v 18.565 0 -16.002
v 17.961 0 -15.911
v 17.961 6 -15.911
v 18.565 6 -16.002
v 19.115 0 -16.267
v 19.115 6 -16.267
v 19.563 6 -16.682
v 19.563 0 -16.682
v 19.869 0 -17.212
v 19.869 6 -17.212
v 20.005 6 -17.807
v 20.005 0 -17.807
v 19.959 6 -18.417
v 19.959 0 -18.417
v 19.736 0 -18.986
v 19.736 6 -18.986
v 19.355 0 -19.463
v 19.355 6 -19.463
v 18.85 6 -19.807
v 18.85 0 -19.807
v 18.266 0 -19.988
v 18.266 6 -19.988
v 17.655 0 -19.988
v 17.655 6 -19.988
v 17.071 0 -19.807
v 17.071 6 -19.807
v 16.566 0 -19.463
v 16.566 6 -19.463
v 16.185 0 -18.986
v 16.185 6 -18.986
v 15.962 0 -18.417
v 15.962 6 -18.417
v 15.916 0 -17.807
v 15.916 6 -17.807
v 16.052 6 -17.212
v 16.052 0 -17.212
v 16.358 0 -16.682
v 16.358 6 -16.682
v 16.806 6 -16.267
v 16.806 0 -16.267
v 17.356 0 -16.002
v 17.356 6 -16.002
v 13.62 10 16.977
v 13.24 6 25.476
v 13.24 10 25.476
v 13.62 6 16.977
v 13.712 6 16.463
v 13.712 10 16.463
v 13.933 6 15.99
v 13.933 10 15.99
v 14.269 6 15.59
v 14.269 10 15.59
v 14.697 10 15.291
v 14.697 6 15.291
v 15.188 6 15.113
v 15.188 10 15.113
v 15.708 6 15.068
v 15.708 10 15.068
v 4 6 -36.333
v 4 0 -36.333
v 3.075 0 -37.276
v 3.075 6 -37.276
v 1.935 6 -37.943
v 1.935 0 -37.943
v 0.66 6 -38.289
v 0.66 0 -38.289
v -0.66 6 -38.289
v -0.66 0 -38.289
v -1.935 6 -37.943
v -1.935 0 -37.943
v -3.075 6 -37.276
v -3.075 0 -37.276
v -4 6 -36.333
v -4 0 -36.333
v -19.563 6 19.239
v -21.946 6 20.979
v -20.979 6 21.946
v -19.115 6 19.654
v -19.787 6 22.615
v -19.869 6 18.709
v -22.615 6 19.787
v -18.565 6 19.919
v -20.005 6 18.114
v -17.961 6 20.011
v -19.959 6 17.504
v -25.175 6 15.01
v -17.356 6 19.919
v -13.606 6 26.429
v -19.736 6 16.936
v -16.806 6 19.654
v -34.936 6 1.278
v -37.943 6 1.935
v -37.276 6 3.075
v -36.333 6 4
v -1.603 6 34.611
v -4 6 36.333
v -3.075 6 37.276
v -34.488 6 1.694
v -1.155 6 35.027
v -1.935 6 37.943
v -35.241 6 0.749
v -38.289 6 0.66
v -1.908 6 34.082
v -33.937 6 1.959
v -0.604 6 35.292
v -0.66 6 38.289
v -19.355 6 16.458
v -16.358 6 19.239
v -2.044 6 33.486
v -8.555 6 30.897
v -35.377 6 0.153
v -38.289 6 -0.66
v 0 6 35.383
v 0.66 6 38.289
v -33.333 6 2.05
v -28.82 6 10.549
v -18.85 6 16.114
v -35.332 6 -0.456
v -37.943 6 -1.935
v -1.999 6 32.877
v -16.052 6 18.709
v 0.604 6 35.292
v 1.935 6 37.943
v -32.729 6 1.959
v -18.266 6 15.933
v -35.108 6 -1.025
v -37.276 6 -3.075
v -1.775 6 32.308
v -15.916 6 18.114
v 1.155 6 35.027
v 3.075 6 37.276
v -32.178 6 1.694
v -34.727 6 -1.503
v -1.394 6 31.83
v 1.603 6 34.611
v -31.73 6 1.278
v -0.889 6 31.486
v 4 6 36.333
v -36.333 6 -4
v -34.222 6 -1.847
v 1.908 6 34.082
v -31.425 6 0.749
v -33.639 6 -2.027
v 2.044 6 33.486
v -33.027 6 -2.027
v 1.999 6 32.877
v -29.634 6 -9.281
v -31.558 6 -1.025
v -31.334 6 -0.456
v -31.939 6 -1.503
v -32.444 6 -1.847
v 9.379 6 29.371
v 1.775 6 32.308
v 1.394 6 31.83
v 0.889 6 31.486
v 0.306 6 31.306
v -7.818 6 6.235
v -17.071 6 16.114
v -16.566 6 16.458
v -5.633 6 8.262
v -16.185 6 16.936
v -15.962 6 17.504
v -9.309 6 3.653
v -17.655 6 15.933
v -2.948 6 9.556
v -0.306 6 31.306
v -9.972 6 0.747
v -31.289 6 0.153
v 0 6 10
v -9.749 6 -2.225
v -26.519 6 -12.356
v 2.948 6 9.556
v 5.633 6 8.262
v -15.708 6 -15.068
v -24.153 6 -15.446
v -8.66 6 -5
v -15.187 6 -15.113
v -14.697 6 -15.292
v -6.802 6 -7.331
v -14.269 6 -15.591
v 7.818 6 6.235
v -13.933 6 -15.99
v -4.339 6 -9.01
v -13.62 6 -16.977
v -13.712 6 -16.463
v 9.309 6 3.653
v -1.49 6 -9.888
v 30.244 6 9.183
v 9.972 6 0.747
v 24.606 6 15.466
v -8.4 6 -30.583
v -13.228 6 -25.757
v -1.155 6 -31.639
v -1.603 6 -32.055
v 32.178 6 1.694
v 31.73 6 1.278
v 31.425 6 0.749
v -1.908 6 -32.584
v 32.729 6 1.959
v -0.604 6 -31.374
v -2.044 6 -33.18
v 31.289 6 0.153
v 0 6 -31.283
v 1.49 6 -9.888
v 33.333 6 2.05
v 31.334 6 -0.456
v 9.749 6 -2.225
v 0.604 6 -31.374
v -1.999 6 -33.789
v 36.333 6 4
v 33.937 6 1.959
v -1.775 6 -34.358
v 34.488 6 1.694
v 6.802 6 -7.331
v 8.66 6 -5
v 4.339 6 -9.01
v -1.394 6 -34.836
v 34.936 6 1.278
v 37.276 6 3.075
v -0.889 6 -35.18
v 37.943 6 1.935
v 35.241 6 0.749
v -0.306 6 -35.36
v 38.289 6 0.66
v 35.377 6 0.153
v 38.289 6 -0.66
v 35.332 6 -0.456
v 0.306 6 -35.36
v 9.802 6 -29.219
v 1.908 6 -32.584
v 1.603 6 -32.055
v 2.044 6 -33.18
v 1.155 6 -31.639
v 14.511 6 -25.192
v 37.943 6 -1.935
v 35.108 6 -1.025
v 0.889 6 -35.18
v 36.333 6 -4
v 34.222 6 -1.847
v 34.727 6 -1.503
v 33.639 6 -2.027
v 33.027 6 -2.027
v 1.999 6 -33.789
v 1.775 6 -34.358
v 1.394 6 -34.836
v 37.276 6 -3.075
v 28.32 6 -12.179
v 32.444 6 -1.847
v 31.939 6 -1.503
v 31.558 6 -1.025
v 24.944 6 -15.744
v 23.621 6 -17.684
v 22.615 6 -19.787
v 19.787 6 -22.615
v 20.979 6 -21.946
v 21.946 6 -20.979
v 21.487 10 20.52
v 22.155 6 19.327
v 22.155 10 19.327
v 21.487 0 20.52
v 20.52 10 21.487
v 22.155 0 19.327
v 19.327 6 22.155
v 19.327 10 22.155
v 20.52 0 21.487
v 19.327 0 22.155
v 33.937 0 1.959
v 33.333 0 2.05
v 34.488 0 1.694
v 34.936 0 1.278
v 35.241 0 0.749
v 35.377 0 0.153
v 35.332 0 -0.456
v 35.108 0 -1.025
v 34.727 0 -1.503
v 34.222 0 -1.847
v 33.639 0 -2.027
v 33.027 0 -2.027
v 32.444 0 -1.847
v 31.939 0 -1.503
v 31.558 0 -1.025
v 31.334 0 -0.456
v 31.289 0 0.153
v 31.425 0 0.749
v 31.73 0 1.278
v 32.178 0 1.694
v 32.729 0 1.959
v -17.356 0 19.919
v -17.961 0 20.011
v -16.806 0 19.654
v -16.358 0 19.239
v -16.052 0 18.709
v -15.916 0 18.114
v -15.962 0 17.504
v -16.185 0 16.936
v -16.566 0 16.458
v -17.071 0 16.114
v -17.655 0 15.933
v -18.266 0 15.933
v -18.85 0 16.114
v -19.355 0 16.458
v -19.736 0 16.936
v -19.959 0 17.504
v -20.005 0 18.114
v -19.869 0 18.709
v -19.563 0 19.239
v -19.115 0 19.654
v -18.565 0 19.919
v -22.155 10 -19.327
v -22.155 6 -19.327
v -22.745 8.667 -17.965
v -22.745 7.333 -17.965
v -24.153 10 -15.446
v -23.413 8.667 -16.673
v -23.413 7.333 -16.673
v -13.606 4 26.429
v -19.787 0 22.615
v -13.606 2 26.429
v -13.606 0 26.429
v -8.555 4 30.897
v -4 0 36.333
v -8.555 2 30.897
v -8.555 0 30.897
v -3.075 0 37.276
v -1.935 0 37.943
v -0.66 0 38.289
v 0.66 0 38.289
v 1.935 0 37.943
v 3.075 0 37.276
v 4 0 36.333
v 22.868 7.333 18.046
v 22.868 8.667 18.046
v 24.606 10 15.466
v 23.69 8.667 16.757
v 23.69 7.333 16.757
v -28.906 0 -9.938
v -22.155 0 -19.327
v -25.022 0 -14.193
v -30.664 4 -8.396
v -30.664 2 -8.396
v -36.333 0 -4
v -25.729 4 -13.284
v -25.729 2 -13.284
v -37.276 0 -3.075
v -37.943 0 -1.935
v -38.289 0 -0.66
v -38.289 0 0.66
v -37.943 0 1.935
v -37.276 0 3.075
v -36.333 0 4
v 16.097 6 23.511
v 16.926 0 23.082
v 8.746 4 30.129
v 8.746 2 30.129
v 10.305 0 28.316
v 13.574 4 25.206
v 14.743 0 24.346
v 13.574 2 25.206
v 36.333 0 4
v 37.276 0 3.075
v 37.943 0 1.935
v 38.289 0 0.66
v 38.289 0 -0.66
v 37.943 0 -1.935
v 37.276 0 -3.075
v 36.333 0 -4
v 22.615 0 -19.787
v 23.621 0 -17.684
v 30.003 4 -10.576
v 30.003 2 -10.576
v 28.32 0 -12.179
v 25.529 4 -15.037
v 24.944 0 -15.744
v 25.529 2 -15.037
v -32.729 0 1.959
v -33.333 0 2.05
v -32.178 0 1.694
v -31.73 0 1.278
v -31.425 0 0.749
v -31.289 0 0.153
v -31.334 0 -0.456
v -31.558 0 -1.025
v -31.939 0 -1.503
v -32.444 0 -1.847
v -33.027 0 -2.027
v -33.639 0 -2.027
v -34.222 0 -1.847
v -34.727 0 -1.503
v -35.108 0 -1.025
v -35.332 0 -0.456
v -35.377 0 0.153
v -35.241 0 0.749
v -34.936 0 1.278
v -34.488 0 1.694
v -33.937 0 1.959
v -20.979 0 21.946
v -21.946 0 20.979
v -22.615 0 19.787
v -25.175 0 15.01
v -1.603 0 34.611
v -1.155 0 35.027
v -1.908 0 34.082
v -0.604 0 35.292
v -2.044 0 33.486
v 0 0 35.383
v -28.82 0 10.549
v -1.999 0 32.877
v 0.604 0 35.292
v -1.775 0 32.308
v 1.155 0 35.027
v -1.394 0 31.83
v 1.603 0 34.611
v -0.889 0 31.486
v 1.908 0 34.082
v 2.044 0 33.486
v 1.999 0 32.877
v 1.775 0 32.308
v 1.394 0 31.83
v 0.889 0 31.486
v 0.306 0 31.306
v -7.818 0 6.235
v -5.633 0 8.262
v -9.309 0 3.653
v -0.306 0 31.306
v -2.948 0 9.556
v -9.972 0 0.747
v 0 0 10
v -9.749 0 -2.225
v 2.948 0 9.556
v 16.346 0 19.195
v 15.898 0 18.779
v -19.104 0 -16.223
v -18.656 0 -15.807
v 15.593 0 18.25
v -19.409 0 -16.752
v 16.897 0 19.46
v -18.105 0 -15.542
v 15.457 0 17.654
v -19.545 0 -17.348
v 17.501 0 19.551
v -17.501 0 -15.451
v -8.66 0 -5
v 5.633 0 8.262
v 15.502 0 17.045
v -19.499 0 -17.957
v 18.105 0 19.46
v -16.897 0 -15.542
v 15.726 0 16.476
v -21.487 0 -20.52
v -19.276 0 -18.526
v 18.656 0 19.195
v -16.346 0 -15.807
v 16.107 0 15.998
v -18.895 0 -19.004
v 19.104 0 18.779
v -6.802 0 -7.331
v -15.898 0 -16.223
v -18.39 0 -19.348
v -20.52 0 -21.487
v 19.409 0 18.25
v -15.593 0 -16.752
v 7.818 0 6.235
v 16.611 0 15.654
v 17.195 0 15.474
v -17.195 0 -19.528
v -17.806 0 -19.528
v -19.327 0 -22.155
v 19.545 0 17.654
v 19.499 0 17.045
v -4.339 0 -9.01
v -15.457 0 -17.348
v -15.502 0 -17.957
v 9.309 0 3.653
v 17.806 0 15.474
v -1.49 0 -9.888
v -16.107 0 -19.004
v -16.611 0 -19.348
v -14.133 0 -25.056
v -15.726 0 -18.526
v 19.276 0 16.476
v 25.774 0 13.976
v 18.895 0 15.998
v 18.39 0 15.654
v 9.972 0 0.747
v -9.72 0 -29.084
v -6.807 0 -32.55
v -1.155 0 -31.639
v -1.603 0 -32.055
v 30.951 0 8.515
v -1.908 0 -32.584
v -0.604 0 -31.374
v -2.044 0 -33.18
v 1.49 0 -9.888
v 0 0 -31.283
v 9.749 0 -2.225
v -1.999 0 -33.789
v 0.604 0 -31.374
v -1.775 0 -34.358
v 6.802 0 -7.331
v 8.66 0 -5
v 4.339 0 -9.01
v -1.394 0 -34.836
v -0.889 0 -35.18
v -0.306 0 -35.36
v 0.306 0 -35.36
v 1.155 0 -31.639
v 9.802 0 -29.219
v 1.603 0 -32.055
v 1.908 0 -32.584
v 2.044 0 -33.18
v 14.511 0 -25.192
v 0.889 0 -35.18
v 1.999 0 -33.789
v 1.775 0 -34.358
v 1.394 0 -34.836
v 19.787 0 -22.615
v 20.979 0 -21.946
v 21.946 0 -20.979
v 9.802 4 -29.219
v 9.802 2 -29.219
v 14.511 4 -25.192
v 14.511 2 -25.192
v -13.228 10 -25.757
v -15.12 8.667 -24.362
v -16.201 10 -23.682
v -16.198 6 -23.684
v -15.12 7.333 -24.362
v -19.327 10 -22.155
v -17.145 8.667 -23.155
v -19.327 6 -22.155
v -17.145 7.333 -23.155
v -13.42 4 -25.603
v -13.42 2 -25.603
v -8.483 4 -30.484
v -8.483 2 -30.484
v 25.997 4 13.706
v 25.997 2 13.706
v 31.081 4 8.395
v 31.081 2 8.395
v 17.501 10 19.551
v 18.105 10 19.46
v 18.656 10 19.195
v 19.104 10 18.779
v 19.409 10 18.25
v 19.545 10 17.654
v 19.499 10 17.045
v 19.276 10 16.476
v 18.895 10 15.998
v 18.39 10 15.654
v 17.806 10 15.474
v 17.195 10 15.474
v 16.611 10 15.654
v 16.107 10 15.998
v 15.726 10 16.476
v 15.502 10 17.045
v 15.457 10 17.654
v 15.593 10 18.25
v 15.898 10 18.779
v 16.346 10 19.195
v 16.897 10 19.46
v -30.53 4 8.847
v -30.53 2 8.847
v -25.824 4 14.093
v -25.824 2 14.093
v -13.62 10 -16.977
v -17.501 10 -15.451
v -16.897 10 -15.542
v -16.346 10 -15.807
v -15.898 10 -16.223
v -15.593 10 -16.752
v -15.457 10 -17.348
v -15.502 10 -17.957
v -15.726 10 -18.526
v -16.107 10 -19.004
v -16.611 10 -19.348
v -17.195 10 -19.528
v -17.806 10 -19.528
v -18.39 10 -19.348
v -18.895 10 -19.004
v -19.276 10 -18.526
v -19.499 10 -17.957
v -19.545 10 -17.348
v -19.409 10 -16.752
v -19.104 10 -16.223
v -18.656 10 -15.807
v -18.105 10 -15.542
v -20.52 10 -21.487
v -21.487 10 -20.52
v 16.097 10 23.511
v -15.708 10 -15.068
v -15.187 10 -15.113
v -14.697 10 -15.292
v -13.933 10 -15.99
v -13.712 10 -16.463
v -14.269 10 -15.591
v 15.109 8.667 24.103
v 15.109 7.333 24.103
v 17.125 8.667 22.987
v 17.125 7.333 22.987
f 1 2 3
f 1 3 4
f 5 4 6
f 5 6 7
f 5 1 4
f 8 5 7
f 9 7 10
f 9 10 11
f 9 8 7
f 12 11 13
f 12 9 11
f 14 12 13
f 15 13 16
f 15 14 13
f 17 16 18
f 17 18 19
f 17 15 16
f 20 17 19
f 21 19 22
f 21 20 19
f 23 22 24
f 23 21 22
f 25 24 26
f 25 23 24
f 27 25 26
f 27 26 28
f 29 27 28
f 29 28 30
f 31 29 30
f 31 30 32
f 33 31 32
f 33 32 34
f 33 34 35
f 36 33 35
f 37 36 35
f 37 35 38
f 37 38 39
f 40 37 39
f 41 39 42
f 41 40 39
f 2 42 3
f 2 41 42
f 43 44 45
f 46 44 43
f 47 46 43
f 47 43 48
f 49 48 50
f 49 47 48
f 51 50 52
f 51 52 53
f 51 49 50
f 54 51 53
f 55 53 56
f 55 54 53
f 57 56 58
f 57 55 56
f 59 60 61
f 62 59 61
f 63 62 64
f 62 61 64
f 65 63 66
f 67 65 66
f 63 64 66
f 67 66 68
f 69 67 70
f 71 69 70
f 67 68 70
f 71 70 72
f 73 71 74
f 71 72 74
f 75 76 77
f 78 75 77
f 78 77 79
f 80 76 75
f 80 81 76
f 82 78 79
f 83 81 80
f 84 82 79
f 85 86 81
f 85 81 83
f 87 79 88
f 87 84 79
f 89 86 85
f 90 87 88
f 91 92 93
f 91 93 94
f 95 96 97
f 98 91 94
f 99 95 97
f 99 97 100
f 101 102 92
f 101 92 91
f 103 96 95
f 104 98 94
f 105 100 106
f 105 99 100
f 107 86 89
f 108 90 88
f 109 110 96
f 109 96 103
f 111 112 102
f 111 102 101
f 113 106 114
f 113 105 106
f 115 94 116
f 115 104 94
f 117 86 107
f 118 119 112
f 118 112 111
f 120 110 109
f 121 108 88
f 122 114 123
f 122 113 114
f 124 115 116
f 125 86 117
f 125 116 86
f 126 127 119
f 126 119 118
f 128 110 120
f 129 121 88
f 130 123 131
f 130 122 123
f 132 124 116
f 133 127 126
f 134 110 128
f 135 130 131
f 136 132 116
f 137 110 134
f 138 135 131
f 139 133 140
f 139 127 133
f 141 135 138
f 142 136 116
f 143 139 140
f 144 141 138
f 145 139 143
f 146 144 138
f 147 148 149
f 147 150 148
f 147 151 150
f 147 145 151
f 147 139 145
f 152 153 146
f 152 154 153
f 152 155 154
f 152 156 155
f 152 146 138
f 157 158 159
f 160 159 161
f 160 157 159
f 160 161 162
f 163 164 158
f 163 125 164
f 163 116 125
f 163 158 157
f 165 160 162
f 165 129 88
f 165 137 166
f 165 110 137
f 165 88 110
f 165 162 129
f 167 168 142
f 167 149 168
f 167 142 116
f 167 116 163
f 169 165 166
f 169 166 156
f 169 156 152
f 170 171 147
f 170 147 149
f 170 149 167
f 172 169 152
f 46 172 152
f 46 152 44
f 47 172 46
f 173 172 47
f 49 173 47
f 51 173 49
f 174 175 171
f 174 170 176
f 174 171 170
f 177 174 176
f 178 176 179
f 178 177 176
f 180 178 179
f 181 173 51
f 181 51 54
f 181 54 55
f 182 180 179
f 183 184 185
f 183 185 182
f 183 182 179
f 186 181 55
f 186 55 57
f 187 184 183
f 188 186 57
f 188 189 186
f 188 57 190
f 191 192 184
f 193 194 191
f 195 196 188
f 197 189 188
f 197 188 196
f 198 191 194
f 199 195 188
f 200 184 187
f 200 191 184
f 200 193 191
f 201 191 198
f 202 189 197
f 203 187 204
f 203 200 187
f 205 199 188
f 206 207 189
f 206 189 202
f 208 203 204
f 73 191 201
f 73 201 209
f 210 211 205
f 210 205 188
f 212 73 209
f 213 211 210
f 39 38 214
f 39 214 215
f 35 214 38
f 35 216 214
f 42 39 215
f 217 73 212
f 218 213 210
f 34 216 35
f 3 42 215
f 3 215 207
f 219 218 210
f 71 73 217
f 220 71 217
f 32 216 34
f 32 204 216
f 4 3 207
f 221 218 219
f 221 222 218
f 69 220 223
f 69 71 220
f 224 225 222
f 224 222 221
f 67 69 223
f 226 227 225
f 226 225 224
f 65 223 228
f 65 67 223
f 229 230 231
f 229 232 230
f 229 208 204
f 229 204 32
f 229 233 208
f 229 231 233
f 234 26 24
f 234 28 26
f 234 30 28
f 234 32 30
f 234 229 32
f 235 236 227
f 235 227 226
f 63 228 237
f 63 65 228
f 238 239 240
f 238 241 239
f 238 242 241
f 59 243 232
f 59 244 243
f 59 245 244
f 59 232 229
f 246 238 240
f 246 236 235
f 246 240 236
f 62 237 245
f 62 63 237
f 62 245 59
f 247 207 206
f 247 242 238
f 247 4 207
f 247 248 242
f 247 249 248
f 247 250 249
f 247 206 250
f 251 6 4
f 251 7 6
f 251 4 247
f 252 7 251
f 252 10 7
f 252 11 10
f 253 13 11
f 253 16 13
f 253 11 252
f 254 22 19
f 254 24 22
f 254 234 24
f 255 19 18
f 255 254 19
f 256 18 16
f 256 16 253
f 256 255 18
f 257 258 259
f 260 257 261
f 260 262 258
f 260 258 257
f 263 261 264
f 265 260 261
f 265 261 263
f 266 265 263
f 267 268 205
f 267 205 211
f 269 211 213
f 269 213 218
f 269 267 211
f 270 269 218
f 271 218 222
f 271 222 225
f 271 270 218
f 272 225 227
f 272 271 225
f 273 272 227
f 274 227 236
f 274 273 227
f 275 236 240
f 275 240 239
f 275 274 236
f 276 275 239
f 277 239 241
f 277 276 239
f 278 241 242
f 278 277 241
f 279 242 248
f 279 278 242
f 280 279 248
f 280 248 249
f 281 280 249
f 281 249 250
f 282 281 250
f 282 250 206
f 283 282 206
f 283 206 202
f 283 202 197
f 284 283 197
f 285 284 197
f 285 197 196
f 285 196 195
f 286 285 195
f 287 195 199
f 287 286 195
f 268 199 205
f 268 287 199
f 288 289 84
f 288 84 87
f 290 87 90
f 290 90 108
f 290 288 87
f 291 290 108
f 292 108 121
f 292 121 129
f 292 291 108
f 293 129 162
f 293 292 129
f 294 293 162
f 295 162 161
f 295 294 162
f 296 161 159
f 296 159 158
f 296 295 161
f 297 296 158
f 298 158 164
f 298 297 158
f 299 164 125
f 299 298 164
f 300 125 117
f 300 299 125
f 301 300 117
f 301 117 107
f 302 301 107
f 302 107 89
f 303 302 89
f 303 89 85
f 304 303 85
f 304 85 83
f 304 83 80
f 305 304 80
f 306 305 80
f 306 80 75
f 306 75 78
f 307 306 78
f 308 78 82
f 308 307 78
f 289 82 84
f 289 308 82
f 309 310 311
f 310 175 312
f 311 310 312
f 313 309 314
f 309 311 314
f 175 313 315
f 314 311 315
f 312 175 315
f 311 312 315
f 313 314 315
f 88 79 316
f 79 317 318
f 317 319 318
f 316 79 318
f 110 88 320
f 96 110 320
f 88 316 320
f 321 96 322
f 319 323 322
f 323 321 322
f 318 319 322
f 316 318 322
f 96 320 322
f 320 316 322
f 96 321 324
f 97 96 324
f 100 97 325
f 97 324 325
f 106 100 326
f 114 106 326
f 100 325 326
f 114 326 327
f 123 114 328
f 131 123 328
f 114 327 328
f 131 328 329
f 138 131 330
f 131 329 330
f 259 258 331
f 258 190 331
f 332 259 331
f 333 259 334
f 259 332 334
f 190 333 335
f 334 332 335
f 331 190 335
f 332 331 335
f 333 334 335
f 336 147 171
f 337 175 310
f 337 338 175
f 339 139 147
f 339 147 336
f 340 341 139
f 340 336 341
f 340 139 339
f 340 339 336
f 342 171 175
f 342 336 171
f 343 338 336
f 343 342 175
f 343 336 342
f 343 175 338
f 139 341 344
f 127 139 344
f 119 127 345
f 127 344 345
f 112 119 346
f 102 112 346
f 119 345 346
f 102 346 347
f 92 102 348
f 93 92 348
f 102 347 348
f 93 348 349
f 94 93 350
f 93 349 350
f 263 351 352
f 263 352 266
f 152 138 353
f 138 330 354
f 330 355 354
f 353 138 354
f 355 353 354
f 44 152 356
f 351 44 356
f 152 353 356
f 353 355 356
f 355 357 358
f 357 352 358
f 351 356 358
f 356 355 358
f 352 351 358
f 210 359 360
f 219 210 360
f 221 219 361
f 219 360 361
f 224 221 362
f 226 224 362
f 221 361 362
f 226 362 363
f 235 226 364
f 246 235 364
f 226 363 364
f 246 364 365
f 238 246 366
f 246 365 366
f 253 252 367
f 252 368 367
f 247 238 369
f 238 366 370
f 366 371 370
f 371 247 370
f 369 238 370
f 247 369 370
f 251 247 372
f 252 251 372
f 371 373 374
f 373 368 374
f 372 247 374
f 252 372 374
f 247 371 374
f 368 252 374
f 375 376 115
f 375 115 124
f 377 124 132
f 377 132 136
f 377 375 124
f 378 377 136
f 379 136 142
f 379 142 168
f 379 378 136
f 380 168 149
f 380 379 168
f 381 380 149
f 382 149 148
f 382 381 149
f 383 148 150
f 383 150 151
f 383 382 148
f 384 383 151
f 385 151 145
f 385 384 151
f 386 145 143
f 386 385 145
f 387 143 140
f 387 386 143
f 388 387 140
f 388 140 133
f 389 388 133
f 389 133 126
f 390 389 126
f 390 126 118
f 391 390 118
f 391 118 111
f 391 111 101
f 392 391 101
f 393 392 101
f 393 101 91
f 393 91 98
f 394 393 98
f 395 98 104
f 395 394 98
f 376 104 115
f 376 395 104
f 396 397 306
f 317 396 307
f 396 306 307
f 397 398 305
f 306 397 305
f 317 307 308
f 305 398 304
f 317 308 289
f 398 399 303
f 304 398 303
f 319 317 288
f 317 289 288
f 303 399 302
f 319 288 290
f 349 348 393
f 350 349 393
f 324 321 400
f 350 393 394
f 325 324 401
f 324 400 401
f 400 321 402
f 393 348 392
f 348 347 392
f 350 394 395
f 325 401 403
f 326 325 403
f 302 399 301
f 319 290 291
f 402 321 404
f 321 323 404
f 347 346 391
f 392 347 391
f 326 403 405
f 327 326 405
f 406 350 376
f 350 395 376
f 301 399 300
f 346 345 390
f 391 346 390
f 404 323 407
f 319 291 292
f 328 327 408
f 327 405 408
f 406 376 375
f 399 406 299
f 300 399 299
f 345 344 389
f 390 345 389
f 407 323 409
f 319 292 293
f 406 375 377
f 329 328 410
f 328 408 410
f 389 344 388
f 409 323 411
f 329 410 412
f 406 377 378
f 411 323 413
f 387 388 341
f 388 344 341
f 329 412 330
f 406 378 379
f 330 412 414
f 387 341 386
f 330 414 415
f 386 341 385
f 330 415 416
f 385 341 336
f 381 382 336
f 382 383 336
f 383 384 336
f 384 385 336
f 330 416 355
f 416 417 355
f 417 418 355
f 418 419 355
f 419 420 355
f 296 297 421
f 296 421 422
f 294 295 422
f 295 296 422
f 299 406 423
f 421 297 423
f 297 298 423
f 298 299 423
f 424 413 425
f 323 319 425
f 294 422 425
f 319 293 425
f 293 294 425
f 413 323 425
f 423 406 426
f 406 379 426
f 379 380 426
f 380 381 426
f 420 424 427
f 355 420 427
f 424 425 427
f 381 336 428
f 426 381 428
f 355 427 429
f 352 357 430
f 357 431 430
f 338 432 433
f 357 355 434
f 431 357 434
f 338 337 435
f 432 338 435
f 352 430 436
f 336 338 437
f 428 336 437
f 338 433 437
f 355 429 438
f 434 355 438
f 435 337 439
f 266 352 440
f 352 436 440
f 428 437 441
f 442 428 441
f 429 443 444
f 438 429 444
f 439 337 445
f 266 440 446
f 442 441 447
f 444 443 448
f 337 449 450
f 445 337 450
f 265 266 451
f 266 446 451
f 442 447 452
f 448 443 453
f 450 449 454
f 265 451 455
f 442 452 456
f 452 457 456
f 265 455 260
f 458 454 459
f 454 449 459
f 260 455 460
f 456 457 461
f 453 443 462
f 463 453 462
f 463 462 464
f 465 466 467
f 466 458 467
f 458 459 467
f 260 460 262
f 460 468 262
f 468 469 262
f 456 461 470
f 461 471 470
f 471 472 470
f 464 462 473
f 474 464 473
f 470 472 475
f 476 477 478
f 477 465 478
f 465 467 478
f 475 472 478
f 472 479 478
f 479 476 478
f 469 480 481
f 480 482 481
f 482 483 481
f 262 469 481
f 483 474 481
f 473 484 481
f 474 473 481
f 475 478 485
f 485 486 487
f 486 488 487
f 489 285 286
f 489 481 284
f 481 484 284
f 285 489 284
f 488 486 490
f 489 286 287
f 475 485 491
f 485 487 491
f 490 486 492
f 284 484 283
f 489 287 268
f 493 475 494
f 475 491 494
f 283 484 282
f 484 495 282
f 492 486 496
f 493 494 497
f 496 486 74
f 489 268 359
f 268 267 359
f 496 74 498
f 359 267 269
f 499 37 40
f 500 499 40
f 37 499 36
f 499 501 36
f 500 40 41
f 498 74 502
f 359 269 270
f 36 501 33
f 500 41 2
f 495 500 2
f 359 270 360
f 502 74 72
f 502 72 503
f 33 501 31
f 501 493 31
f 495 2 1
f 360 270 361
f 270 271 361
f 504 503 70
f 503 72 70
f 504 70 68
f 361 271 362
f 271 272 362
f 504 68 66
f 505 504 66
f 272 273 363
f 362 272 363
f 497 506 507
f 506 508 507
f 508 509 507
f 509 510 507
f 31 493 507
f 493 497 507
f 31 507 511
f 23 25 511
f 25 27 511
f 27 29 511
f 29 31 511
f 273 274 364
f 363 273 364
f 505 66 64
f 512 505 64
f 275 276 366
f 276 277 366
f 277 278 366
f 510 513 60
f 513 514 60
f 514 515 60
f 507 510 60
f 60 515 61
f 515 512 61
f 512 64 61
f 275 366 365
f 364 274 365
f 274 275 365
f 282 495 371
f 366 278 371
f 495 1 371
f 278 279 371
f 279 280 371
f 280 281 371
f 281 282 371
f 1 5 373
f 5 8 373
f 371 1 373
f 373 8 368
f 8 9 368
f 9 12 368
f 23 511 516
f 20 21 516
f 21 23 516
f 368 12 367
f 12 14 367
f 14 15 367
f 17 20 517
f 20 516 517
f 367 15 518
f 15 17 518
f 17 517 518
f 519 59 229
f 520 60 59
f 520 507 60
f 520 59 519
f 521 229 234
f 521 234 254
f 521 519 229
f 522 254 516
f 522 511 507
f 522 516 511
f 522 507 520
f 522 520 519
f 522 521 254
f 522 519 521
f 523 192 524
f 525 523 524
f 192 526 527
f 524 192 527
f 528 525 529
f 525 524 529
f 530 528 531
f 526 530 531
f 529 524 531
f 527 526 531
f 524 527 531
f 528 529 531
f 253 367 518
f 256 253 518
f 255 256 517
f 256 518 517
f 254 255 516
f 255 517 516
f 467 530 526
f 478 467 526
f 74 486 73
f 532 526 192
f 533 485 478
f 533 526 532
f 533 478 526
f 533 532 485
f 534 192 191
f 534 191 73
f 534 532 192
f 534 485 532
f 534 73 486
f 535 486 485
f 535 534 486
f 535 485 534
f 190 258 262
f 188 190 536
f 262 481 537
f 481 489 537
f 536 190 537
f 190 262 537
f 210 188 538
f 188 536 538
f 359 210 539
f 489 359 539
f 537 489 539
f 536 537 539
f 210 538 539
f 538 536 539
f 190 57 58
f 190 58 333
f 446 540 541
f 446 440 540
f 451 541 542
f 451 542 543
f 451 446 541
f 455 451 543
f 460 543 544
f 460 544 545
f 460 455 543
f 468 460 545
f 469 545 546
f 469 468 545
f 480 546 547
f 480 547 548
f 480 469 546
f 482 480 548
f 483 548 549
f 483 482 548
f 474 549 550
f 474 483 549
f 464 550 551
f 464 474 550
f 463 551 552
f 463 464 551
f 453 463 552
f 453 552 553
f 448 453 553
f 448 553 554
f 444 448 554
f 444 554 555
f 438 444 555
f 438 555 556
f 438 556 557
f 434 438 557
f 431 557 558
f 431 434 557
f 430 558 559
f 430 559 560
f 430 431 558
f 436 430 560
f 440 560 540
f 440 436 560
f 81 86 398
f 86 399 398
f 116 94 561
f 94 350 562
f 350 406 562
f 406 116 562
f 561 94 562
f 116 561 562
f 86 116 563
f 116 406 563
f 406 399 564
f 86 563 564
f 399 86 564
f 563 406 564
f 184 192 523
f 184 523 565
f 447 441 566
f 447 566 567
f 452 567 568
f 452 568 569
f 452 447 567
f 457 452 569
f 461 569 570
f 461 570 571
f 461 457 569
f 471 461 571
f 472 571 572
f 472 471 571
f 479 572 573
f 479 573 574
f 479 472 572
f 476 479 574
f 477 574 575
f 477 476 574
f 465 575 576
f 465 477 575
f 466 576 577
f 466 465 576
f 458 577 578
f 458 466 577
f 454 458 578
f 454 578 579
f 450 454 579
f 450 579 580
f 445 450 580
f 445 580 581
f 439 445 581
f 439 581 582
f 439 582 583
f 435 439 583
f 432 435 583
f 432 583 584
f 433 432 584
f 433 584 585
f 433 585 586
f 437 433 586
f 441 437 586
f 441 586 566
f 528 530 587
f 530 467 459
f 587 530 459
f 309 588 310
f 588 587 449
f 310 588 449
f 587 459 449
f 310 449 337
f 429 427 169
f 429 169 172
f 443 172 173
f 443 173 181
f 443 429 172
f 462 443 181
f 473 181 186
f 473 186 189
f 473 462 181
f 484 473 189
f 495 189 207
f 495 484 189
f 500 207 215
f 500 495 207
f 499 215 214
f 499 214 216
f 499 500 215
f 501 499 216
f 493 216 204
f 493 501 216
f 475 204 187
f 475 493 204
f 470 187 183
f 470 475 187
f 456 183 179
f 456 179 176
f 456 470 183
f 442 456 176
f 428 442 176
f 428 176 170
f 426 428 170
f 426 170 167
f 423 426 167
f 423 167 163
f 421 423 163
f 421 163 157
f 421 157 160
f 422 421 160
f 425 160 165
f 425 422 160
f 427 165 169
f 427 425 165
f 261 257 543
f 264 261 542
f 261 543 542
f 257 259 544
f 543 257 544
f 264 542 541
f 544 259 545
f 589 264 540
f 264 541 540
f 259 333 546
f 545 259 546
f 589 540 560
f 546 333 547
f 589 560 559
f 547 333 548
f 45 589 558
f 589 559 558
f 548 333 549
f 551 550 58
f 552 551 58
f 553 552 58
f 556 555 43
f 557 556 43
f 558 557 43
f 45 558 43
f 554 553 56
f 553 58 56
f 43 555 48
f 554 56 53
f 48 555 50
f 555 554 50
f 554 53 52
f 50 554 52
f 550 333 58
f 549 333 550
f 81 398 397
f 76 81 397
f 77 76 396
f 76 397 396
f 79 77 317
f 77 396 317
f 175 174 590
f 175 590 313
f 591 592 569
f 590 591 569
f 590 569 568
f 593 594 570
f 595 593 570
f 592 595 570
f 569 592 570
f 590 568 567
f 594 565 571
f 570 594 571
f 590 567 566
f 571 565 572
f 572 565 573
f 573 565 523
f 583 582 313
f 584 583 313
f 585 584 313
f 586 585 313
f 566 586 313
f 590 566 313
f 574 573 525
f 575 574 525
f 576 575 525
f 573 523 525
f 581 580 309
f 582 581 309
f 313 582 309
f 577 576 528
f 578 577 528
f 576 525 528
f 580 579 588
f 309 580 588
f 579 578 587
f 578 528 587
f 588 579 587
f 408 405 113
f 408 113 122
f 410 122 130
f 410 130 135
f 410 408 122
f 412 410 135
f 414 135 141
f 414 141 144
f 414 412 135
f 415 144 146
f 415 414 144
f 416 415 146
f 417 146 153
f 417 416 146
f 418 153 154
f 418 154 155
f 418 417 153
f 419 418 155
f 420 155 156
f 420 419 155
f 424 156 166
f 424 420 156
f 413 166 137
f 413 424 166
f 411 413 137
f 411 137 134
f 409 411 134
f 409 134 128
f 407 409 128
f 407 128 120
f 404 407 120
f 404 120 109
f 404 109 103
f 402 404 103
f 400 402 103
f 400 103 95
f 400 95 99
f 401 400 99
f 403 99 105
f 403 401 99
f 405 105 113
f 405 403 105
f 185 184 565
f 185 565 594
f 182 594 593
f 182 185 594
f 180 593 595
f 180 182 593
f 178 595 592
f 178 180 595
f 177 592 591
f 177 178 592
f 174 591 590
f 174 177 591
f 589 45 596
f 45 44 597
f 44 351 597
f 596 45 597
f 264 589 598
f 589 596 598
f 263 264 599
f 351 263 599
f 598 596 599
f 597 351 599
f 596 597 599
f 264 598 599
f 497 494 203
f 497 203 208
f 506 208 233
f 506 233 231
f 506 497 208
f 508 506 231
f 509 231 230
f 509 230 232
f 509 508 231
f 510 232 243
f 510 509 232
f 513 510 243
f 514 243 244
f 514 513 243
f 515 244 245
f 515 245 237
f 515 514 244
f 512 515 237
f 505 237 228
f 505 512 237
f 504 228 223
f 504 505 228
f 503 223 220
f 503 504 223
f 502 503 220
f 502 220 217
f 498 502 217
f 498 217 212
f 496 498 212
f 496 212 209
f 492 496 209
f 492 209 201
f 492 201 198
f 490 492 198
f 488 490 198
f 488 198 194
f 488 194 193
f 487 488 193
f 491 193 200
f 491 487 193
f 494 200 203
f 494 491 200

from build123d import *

# Parameters (mm, degrees)
SKETCH2_R           = 2.05
SKETCH2_R_2         = 10
BOSS_EXTRUDE1_DEPTH = 6
SKETCH4_R           = 2.05
BOSS_EXTRUDE2_DEPTH = 4


with BuildPart() as part:
    # Sketch2 → Boss-Extrude1 (new body)
    with BuildSketch(Plane(origin=(0, 0, 0), x_dir=(1, 0, 0), z_dir=(0, 1, 0))):
        with BuildLine():
            ThreePointArc((4, 36.333013665), (0, 38.333013665), (-4, 36.333013665))
            add(Edge.make_bspline(
                [(-19.327049621, 22.155476746), (-12.763587626, 24.730553465), (-8.427522415, 30.156498127), (-4, 36.333013665)],
                knots=[0, 0, 0, 0, 1, 1, 1, 1], degree=3))
            ThreePointArc((-19.327049621, 22.155476746), (-21.03642674, 21.03642674), (-22.155476746, 19.327049621))
            add(Edge.make_bspline(
                [(-36.333013665, 4), (-30.505064465, 8.3709619), (-24.839849632, 12.485009038), (-22.155476746, 19.327049621)],
                knots=[0, 0, 0, 0, 1, 1, 1, 1], degree=3))
            ThreePointArc((-36.333013665, 4), (-38.333013665, 0), (-36.333013665, -4))
            add(Edge.make_bspline(
                [(-36.333013665, -4), (-30.114152071, -8.664146195), (-24.942929086, -13.853392219), (-22.615096154, -19.786669029)],
                knots=[0, 0, 0, 0, 1, 1, 1, 1], degree=3))
            ThreePointArc((-22.615096154, -19.786669029), (-21.496046148, -21.496046148), (-19.786669029, -22.615096154))
            add(Edge.make_bspline(
                [(-19.786669029, -22.615096154), (-12.829111765, -26.205220822), (-8.517950555, -30.309079592), (-4, -36.333013665)],
                knots=[0, 0, 0, 0, 1, 1, 1, 1], degree=3))
            ThreePointArc((-4, -36.333013665), (0, -38.333013665), (4, -36.333013665))
            add(Edge.make_bspline(
                [(4, -36.333013665), (8.986714341, -29.68406121), (12.829629407, -24.073808118), (19.327049621, -22.155476746)],
                knots=[0, 0, 0, 0, 1, 1, 1, 1], degree=3))
            ThreePointArc((19.327049621, -22.155476746), (21.03642674, -21.03642674), (22.155476746, -19.327049621))
            add(Edge.make_bspline(
                [(22.155476746, -19.327049621), (25.018370869, -13.753003663), (31.354300327, -7.734035003), (36.333013665, -4)],
                knots=[0, 0, 0, 0, 1, 1, 1, 1], degree=3))
            ThreePointArc((36.333013665, -4), (38.333013665, 0), (36.333013665, 4))
            add(Edge.make_bspline(
                [(36.333013665, 4), (28.974985707, 12.434827797), (24.849369186, 14.09186156), (22.615096154, 19.786669029)],
                knots=[0, 0, 0, 0, 1, 1, 1, 1], degree=3))
            ThreePointArc((22.615096154, 19.786669029), (21.496046148, 21.496046148), (19.786669029, 22.615096154))
            add(Edge.make_bspline(
                [(4, 36.333013665), (10.902815442, 27.129259742), (13.673195705, 25.013626509), (19.786669029, 22.615096154)],
                knots=[0, 0, 0, 0, 1, 1, 1, 1], degree=3))
        make_face()
        with Locations(Location((0, 33.333013665, 0), (0, 0, 270))):
            Circle(SKETCH2_R, mode=Mode.SUBTRACT)
        with Locations(Location((33.333013665, 0, 0), (0, 0, 270))):
            Circle(SKETCH2_R, mode=Mode.SUBTRACT)
        with Locations(Location((0, -33.333013665, 0), (0, 0, 270))):
            Circle(SKETCH2_R, mode=Mode.SUBTRACT)
        with Locations(Location((-33.333013665, 0, 0), (0, 0, 270))):
            Circle(SKETCH2_R, mode=Mode.SUBTRACT)
        with Locations(Location((0, 0, 0), (0, 0, 270))):
            Circle(SKETCH2_R_2, mode=Mode.SUBTRACT)
        with Locations(Location((-17.500892834, 17.500892834, 0), (0, 0, 270))):
            Circle(SKETCH2_R, mode=Mode.SUBTRACT)
        with Locations(Location((-17.960512242, -17.960512242, 0), (0, 0, 270))):
            Circle(SKETCH2_R, mode=Mode.SUBTRACT)
        with Locations(Location((17.960512242, 17.960512242, 0), (0, 0, 270))):
            Circle(SKETCH2_R, mode=Mode.SUBTRACT)
        with Locations(Location((17.500892834, -17.500892834, 0), (0, 0, 270))):
            Circle(SKETCH2_R, mode=Mode.SUBTRACT)
    extrude(amount=BOSS_EXTRUDE1_DEPTH)

    # Sketch4 → Boss-Extrude2 (add)
    # profile 1 of 2: a face of its own
    with BuildSketch(Plane(origin=(0, 6, 0), x_dir=(1, 0, 0), z_dir=(0, 1, 0))):
        with BuildLine():
            Line((15.707753118, -15.068373573), (24.606369586, -15.466232362))
            add(Edge.make_bspline(
                [(22.155476746, -19.327049621), (22.810102957, -18.052494423), (23.646316442, -16.75467649), (24.606369586, -15.466232362)],
                knots=[0, 0, 0, 0, 0.228658897, 0.228658897, 0.228658897, 0.228658897], degree=3))
            ThreePointArc((22.155476746, -19.327049621), (21.03642674, -21.03642674), (19.327049621, -22.155476746))
            add(Edge.make_bspline(
                [(13.240425147, -25.476068549), (15.048020958, -23.982995667), (17.020234836, -22.836552469), (19.327049621, -22.155476746)],
                knots=[0.644964508, 0.644964508, 0.644964508, 0.644964508, 1, 1, 1, 1], degree=3))
            Line((13.240425147, -25.476068549), (13.620417999, -16.977046436))
            ThreePointArc((13.620417999, -16.977046436), (14.268786465, -15.590408746), (15.707753118, -15.068373573))
        make_face()
        with Locations(Location((17.500892834, -17.500892834, 0), (0, 0, 270))):
            Circle(SKETCH4_R, mode=Mode.SUBTRACT)
    # profile 2 of 2: a face of its own
    with BuildSketch(Plane(origin=(0, 6, 0), x_dir=(1, 0, 0), z_dir=(0, 1, 0))):
        with BuildLine():
            Line((-13.228436316, 25.756908597), (-13.620382808, 16.977307181))
            ThreePointArc((-13.620382808, 16.977307181), (-14.2686581, 15.590625928), (-15.707589672, 15.068494066))
            Line((-15.707589672, 15.068494066), (-24.152657128, 15.445506006))
            add(Edge.make_bspline(
                [(-22.155476746, 19.327049621), (-22.704535018, 17.927587199), (-23.378300091, 16.642253384), (-24.152657128, 15.445506006)],
                knots=[0, 0, 0, 0, 0.204538749, 0.204538749, 0.204538749, 0.204538749], degree=3))
            ThreePointArc((-22.155476746, 19.327049621), (-21.03642674, 21.03642674), (-19.327049621, 22.155476746))
            add(Edge.make_bspline(
                [(-13.228436316, 25.756908597), (-15.059327702, 24.27409121), (-17.060362093, 23.044777893), (-19.327049621, 22.155476746)],
                knots=[0.65465062, 0.65465062, 0.65465062, 0.65465062, 1, 1, 1, 1], degree=3))
        make_face()
        with Locations(Location((-17.500892834, 17.500892834, 0), (0, 0, 270))):
            Circle(SKETCH4_R, mode=Mode.SUBTRACT)
    extrude(amount=BOSS_EXTRUDE2_DEPTH)


solid = part.part
